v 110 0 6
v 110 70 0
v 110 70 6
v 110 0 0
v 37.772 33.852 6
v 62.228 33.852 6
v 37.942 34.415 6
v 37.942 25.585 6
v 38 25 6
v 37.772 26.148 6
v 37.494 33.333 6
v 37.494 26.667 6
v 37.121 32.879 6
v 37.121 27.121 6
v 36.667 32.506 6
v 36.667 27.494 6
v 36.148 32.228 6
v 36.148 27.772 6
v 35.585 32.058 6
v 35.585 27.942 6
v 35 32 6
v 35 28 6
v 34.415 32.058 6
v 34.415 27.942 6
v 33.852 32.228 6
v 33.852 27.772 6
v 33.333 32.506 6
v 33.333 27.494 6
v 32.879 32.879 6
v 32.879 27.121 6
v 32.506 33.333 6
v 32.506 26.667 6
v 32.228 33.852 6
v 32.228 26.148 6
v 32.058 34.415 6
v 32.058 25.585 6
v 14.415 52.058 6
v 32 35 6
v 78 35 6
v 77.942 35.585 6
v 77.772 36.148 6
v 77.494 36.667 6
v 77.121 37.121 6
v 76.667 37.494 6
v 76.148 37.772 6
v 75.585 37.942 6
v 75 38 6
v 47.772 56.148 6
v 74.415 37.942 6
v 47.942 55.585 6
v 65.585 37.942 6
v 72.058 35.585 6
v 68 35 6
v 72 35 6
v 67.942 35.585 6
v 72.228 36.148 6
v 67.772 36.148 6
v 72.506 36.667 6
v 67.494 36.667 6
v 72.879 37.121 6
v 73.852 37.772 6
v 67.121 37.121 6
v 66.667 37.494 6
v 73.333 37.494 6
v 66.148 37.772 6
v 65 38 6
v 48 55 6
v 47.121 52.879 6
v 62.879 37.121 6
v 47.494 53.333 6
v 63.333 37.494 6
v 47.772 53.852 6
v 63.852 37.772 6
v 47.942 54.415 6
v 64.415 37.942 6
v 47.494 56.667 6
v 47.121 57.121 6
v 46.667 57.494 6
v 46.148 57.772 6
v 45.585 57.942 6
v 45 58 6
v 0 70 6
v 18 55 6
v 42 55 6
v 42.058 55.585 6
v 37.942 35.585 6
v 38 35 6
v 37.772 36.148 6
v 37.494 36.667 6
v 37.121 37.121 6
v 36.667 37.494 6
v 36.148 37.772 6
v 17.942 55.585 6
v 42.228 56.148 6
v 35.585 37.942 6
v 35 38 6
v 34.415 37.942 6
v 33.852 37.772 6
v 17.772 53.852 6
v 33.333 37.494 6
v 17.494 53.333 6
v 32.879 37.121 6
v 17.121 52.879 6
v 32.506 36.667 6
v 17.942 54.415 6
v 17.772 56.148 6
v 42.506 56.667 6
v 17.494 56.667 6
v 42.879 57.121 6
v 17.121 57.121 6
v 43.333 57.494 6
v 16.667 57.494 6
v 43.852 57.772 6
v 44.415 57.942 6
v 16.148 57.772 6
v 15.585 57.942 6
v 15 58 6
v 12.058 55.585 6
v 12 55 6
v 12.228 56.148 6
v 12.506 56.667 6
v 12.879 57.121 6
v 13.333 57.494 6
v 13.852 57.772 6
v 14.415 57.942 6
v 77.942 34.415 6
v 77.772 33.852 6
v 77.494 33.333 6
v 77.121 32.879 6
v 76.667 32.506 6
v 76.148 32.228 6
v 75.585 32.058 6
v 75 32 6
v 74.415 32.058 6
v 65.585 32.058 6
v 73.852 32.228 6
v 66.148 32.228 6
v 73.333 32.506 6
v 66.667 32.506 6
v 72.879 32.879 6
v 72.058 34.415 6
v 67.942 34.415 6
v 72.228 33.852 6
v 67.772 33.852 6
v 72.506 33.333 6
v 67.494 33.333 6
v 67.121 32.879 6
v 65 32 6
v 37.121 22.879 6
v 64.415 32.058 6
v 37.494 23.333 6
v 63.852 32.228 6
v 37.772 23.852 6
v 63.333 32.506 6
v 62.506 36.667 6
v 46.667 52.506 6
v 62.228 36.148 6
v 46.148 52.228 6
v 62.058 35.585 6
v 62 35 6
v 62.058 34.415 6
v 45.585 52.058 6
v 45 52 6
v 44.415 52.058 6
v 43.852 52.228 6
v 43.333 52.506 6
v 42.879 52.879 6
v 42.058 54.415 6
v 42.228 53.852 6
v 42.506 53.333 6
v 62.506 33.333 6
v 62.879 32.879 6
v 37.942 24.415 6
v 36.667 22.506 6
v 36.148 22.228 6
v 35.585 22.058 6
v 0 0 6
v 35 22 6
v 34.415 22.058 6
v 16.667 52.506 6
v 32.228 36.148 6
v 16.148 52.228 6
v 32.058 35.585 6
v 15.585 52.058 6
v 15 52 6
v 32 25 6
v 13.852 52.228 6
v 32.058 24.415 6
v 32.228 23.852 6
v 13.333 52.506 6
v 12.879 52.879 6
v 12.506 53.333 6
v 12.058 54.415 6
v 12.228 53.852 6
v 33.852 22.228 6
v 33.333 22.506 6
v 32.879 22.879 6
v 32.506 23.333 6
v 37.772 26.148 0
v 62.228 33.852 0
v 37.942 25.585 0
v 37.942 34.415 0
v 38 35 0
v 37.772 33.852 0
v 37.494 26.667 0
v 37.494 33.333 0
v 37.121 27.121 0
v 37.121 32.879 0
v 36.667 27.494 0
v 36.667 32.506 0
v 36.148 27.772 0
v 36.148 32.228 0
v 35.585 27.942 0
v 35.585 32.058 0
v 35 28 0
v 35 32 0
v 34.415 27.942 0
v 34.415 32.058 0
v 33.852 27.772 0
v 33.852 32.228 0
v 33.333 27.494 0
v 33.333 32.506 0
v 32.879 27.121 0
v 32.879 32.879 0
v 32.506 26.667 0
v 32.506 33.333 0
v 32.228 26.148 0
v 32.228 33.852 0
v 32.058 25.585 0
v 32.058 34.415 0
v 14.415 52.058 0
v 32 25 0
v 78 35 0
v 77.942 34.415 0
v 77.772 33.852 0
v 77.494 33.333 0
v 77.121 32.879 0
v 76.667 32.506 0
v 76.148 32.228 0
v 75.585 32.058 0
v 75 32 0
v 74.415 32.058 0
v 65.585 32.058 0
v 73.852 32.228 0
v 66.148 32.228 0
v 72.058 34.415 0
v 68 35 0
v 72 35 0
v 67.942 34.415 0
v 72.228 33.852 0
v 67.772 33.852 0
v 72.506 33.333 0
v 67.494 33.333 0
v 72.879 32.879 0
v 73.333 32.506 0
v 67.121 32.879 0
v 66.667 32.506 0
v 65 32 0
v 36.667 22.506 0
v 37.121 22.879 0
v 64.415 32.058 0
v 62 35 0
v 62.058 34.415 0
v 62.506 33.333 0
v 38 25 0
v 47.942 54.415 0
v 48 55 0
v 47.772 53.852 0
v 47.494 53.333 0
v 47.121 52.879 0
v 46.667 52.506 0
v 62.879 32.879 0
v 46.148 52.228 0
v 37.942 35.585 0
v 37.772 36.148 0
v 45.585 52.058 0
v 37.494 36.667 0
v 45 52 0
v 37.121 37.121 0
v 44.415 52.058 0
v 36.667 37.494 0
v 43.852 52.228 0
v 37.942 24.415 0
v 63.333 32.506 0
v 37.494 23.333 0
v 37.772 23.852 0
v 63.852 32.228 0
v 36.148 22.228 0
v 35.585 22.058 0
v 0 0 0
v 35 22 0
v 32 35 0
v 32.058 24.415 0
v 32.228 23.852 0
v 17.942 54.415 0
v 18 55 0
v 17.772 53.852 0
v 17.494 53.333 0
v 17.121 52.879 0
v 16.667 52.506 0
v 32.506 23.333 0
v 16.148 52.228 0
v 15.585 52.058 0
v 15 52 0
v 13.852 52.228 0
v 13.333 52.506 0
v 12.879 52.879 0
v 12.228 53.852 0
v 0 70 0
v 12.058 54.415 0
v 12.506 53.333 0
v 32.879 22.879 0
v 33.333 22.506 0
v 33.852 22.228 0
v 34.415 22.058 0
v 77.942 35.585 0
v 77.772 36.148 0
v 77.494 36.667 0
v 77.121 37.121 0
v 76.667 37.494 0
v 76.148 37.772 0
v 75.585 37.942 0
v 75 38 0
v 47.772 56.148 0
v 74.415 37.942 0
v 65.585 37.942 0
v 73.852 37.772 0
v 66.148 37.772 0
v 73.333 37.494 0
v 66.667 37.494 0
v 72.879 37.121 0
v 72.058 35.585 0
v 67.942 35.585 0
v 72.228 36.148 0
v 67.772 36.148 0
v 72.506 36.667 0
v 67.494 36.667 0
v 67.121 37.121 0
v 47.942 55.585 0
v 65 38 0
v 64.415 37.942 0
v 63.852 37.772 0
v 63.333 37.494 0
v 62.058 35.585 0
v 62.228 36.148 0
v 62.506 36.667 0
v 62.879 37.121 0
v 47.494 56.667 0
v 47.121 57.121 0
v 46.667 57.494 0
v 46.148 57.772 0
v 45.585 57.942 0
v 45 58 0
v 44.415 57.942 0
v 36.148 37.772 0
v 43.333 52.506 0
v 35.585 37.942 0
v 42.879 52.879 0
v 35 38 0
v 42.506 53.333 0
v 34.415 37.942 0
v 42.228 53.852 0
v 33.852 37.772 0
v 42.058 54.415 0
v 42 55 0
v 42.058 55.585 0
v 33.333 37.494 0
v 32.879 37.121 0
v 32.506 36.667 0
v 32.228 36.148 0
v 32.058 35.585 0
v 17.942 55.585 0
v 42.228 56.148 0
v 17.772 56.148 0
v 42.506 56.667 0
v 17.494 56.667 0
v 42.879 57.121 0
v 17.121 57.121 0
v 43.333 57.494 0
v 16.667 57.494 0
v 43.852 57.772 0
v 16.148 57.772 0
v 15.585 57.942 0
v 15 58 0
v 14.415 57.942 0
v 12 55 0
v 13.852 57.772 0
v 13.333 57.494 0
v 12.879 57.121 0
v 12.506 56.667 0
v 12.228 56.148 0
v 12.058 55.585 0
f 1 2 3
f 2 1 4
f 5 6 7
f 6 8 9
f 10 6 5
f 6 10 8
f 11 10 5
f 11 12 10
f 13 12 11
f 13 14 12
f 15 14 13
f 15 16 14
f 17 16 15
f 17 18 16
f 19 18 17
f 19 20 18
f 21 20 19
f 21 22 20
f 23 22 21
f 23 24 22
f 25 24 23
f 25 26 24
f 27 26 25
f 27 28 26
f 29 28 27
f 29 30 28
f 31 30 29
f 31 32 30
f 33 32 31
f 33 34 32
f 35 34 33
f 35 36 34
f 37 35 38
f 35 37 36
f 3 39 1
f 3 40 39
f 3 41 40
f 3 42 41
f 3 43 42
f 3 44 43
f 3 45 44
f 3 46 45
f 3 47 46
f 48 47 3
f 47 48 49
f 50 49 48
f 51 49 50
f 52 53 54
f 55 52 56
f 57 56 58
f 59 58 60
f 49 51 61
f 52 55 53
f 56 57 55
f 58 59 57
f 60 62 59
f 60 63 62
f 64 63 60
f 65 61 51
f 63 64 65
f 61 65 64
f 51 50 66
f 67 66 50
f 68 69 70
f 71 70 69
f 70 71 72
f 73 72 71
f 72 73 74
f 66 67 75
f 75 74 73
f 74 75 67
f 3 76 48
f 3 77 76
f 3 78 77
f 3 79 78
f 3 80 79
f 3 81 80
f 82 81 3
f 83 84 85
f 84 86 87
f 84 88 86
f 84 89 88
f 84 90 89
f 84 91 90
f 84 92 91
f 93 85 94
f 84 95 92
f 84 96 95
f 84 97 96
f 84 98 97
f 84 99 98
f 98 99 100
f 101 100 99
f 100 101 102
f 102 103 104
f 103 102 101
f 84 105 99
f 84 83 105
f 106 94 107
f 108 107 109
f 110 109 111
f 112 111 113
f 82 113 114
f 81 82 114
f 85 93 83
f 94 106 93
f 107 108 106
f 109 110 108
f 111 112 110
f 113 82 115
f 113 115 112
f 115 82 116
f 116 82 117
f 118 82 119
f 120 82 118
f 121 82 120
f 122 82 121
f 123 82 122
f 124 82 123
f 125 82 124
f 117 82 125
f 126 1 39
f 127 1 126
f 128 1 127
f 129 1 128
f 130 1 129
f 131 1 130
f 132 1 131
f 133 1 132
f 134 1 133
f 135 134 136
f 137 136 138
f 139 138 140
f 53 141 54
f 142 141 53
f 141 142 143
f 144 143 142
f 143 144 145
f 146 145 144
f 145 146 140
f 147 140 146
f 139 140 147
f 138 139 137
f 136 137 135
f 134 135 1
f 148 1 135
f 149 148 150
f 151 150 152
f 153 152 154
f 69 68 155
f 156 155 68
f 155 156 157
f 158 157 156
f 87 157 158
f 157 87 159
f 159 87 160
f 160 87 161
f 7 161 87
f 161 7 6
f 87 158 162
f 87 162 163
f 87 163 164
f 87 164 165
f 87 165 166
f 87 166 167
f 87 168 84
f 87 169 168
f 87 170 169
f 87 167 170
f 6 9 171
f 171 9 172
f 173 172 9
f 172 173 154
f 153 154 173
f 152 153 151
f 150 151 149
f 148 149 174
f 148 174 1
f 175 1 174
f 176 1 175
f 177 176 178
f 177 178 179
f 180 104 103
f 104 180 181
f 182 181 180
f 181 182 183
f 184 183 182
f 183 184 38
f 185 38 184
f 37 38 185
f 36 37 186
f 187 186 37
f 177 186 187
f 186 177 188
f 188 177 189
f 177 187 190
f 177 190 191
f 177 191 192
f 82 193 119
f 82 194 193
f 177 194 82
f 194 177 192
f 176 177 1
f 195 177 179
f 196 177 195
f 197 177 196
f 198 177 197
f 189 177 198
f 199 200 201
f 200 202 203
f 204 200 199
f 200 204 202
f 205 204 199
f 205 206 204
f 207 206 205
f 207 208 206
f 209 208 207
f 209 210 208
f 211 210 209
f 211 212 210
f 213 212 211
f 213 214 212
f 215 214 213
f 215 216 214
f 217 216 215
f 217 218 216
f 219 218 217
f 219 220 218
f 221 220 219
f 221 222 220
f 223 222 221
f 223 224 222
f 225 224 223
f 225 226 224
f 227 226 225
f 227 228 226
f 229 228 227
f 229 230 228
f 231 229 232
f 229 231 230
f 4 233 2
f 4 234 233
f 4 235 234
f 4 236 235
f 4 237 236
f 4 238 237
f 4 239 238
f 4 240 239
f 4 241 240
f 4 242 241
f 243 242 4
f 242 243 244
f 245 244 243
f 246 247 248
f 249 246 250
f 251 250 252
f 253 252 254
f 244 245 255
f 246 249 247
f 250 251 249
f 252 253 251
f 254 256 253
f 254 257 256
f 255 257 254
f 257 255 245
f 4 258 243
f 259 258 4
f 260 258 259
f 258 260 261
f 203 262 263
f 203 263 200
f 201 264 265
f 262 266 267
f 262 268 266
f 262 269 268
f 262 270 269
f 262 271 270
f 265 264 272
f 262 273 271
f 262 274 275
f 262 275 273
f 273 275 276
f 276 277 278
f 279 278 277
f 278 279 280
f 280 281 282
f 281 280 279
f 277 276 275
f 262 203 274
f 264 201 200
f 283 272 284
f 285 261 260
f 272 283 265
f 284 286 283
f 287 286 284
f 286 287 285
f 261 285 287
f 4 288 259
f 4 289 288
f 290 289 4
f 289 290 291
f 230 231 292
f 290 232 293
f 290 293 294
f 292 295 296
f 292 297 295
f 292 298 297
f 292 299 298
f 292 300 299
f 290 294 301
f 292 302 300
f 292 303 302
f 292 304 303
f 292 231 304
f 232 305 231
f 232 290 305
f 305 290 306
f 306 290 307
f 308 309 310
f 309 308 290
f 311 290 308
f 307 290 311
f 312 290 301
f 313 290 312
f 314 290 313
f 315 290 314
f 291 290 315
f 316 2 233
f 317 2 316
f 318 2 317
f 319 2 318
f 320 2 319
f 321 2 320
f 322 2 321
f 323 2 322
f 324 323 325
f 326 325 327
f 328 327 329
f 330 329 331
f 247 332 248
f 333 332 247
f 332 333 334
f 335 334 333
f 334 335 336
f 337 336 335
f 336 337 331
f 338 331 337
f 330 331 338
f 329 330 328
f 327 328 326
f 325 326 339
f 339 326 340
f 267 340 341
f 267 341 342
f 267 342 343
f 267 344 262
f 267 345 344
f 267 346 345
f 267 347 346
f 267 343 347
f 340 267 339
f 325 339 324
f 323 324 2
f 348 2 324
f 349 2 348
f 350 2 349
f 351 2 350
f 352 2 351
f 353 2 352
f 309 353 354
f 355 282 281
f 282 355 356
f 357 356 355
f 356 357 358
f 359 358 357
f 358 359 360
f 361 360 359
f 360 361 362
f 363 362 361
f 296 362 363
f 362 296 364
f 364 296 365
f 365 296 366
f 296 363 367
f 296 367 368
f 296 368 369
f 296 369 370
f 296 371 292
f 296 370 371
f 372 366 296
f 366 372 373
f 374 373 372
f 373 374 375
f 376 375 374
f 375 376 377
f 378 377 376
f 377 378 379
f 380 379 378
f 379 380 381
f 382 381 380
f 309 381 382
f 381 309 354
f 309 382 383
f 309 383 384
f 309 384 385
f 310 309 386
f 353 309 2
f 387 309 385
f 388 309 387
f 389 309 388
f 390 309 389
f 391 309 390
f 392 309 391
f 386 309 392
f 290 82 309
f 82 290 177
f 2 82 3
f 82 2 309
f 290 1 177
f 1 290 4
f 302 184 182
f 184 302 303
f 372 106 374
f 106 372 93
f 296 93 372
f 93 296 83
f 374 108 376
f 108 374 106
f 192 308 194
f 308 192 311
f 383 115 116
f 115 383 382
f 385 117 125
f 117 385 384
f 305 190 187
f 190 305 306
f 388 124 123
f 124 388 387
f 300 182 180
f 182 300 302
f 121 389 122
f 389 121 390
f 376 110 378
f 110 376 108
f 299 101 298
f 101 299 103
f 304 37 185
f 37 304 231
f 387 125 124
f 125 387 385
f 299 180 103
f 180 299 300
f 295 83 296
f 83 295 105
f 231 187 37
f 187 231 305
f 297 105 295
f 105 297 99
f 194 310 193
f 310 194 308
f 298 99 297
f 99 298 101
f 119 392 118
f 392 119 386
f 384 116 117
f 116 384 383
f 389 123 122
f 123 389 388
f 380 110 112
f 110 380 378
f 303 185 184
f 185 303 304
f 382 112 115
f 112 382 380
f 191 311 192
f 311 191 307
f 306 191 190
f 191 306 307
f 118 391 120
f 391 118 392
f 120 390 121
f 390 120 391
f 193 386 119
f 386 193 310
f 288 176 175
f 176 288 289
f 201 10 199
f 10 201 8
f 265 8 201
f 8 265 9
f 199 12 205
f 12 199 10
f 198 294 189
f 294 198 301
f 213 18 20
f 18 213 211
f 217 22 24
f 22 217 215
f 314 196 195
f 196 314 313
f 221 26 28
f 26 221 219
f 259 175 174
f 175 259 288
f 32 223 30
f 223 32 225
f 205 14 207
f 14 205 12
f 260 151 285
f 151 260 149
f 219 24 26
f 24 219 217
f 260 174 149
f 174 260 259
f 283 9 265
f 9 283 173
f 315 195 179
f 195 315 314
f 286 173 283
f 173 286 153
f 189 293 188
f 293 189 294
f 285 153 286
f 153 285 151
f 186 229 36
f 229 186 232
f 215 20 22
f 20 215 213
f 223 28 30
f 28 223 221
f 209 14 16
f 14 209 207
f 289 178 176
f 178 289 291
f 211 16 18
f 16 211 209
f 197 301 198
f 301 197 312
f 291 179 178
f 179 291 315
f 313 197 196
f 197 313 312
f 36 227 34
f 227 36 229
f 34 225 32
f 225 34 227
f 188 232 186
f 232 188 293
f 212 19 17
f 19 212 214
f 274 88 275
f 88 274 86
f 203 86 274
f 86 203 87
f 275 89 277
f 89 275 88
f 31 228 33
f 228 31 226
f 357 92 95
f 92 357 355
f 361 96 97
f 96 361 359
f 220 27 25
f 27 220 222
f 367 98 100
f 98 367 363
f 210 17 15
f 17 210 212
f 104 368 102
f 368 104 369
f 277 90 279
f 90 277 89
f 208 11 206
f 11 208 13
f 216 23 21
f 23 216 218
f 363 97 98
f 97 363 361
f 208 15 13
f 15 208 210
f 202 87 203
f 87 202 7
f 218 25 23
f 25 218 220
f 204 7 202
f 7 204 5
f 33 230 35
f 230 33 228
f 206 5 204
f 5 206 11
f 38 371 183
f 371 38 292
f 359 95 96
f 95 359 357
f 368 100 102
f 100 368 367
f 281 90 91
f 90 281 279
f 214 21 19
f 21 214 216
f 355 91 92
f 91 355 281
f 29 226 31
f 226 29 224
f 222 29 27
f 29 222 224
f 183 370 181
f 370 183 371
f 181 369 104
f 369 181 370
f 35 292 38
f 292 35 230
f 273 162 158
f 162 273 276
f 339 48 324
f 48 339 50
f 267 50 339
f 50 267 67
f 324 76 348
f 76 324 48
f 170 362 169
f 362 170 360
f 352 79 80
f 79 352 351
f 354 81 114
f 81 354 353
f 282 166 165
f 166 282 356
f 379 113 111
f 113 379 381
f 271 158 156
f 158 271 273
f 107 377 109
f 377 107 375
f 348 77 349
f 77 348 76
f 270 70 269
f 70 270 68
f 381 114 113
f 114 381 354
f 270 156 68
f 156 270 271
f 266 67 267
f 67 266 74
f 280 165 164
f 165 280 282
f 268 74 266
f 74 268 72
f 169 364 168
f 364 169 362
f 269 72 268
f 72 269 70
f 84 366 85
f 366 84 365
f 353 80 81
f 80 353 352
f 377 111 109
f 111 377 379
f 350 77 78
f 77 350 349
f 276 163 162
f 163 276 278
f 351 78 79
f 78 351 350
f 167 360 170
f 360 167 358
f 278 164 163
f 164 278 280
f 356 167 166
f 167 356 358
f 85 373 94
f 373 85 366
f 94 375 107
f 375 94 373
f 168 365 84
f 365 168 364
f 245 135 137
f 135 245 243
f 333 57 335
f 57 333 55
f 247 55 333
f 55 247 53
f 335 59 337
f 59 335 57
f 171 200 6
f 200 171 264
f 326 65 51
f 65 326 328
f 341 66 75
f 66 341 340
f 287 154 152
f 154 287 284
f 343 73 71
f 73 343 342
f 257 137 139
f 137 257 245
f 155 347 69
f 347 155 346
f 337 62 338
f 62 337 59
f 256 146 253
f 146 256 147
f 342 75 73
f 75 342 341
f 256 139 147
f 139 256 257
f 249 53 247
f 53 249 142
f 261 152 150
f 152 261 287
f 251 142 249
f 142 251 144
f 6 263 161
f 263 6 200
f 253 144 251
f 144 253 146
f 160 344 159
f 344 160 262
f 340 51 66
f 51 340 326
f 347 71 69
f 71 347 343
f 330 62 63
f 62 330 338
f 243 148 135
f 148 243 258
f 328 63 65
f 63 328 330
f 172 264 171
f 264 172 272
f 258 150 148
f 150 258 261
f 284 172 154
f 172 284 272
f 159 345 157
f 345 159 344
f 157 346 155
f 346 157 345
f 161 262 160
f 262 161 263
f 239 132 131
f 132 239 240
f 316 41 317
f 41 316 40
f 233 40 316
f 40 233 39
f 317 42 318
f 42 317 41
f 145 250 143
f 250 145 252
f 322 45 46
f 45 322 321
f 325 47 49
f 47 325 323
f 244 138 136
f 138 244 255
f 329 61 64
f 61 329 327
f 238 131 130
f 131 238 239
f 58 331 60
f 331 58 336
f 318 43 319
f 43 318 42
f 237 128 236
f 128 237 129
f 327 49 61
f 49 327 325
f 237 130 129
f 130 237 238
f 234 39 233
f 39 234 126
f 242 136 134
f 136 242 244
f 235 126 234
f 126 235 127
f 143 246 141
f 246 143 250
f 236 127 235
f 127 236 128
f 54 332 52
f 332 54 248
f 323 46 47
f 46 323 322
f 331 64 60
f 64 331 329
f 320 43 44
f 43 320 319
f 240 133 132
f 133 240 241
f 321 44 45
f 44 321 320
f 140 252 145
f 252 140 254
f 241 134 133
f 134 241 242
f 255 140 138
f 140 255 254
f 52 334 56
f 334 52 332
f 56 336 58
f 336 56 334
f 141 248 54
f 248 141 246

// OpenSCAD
$fn = 32;

// ----------------------------------------------------------------------
// Hole field: plate with holes at given coordinates
// ----------------------------------------------------------------------

// --- parameters (mm) ---
plate_l = 110;            // plate length, X
plate_w = 70;             // plate width, Y
plate_t = 6;              // plate thickness, Z
hole_d = 6;               // hole diameter
fit_tol = 0.05;           // tolerance for press fits, mm
free_tol = 0.2;           // tolerance for clearance fits, mm

difference() {
  cube([plate_l, plate_w, plate_t]);
  translate([15, 55, -1]) cylinder(h = plate_t + 2, d = hole_d);
  translate([35, 25, -1]) cylinder(h = plate_t + 2, d = hole_d);
  translate([35, 35, -1]) cylinder(h = plate_t + 2, d = hole_d);
  translate([45, 55, -1]) cylinder(h = plate_t + 2, d = hole_d);
  translate([65, 35, -1]) cylinder(h = plate_t + 2, d = hole_d);
  translate([75, 35, -1]) cylinder(h = plate_t + 2, d = hole_d);
}
